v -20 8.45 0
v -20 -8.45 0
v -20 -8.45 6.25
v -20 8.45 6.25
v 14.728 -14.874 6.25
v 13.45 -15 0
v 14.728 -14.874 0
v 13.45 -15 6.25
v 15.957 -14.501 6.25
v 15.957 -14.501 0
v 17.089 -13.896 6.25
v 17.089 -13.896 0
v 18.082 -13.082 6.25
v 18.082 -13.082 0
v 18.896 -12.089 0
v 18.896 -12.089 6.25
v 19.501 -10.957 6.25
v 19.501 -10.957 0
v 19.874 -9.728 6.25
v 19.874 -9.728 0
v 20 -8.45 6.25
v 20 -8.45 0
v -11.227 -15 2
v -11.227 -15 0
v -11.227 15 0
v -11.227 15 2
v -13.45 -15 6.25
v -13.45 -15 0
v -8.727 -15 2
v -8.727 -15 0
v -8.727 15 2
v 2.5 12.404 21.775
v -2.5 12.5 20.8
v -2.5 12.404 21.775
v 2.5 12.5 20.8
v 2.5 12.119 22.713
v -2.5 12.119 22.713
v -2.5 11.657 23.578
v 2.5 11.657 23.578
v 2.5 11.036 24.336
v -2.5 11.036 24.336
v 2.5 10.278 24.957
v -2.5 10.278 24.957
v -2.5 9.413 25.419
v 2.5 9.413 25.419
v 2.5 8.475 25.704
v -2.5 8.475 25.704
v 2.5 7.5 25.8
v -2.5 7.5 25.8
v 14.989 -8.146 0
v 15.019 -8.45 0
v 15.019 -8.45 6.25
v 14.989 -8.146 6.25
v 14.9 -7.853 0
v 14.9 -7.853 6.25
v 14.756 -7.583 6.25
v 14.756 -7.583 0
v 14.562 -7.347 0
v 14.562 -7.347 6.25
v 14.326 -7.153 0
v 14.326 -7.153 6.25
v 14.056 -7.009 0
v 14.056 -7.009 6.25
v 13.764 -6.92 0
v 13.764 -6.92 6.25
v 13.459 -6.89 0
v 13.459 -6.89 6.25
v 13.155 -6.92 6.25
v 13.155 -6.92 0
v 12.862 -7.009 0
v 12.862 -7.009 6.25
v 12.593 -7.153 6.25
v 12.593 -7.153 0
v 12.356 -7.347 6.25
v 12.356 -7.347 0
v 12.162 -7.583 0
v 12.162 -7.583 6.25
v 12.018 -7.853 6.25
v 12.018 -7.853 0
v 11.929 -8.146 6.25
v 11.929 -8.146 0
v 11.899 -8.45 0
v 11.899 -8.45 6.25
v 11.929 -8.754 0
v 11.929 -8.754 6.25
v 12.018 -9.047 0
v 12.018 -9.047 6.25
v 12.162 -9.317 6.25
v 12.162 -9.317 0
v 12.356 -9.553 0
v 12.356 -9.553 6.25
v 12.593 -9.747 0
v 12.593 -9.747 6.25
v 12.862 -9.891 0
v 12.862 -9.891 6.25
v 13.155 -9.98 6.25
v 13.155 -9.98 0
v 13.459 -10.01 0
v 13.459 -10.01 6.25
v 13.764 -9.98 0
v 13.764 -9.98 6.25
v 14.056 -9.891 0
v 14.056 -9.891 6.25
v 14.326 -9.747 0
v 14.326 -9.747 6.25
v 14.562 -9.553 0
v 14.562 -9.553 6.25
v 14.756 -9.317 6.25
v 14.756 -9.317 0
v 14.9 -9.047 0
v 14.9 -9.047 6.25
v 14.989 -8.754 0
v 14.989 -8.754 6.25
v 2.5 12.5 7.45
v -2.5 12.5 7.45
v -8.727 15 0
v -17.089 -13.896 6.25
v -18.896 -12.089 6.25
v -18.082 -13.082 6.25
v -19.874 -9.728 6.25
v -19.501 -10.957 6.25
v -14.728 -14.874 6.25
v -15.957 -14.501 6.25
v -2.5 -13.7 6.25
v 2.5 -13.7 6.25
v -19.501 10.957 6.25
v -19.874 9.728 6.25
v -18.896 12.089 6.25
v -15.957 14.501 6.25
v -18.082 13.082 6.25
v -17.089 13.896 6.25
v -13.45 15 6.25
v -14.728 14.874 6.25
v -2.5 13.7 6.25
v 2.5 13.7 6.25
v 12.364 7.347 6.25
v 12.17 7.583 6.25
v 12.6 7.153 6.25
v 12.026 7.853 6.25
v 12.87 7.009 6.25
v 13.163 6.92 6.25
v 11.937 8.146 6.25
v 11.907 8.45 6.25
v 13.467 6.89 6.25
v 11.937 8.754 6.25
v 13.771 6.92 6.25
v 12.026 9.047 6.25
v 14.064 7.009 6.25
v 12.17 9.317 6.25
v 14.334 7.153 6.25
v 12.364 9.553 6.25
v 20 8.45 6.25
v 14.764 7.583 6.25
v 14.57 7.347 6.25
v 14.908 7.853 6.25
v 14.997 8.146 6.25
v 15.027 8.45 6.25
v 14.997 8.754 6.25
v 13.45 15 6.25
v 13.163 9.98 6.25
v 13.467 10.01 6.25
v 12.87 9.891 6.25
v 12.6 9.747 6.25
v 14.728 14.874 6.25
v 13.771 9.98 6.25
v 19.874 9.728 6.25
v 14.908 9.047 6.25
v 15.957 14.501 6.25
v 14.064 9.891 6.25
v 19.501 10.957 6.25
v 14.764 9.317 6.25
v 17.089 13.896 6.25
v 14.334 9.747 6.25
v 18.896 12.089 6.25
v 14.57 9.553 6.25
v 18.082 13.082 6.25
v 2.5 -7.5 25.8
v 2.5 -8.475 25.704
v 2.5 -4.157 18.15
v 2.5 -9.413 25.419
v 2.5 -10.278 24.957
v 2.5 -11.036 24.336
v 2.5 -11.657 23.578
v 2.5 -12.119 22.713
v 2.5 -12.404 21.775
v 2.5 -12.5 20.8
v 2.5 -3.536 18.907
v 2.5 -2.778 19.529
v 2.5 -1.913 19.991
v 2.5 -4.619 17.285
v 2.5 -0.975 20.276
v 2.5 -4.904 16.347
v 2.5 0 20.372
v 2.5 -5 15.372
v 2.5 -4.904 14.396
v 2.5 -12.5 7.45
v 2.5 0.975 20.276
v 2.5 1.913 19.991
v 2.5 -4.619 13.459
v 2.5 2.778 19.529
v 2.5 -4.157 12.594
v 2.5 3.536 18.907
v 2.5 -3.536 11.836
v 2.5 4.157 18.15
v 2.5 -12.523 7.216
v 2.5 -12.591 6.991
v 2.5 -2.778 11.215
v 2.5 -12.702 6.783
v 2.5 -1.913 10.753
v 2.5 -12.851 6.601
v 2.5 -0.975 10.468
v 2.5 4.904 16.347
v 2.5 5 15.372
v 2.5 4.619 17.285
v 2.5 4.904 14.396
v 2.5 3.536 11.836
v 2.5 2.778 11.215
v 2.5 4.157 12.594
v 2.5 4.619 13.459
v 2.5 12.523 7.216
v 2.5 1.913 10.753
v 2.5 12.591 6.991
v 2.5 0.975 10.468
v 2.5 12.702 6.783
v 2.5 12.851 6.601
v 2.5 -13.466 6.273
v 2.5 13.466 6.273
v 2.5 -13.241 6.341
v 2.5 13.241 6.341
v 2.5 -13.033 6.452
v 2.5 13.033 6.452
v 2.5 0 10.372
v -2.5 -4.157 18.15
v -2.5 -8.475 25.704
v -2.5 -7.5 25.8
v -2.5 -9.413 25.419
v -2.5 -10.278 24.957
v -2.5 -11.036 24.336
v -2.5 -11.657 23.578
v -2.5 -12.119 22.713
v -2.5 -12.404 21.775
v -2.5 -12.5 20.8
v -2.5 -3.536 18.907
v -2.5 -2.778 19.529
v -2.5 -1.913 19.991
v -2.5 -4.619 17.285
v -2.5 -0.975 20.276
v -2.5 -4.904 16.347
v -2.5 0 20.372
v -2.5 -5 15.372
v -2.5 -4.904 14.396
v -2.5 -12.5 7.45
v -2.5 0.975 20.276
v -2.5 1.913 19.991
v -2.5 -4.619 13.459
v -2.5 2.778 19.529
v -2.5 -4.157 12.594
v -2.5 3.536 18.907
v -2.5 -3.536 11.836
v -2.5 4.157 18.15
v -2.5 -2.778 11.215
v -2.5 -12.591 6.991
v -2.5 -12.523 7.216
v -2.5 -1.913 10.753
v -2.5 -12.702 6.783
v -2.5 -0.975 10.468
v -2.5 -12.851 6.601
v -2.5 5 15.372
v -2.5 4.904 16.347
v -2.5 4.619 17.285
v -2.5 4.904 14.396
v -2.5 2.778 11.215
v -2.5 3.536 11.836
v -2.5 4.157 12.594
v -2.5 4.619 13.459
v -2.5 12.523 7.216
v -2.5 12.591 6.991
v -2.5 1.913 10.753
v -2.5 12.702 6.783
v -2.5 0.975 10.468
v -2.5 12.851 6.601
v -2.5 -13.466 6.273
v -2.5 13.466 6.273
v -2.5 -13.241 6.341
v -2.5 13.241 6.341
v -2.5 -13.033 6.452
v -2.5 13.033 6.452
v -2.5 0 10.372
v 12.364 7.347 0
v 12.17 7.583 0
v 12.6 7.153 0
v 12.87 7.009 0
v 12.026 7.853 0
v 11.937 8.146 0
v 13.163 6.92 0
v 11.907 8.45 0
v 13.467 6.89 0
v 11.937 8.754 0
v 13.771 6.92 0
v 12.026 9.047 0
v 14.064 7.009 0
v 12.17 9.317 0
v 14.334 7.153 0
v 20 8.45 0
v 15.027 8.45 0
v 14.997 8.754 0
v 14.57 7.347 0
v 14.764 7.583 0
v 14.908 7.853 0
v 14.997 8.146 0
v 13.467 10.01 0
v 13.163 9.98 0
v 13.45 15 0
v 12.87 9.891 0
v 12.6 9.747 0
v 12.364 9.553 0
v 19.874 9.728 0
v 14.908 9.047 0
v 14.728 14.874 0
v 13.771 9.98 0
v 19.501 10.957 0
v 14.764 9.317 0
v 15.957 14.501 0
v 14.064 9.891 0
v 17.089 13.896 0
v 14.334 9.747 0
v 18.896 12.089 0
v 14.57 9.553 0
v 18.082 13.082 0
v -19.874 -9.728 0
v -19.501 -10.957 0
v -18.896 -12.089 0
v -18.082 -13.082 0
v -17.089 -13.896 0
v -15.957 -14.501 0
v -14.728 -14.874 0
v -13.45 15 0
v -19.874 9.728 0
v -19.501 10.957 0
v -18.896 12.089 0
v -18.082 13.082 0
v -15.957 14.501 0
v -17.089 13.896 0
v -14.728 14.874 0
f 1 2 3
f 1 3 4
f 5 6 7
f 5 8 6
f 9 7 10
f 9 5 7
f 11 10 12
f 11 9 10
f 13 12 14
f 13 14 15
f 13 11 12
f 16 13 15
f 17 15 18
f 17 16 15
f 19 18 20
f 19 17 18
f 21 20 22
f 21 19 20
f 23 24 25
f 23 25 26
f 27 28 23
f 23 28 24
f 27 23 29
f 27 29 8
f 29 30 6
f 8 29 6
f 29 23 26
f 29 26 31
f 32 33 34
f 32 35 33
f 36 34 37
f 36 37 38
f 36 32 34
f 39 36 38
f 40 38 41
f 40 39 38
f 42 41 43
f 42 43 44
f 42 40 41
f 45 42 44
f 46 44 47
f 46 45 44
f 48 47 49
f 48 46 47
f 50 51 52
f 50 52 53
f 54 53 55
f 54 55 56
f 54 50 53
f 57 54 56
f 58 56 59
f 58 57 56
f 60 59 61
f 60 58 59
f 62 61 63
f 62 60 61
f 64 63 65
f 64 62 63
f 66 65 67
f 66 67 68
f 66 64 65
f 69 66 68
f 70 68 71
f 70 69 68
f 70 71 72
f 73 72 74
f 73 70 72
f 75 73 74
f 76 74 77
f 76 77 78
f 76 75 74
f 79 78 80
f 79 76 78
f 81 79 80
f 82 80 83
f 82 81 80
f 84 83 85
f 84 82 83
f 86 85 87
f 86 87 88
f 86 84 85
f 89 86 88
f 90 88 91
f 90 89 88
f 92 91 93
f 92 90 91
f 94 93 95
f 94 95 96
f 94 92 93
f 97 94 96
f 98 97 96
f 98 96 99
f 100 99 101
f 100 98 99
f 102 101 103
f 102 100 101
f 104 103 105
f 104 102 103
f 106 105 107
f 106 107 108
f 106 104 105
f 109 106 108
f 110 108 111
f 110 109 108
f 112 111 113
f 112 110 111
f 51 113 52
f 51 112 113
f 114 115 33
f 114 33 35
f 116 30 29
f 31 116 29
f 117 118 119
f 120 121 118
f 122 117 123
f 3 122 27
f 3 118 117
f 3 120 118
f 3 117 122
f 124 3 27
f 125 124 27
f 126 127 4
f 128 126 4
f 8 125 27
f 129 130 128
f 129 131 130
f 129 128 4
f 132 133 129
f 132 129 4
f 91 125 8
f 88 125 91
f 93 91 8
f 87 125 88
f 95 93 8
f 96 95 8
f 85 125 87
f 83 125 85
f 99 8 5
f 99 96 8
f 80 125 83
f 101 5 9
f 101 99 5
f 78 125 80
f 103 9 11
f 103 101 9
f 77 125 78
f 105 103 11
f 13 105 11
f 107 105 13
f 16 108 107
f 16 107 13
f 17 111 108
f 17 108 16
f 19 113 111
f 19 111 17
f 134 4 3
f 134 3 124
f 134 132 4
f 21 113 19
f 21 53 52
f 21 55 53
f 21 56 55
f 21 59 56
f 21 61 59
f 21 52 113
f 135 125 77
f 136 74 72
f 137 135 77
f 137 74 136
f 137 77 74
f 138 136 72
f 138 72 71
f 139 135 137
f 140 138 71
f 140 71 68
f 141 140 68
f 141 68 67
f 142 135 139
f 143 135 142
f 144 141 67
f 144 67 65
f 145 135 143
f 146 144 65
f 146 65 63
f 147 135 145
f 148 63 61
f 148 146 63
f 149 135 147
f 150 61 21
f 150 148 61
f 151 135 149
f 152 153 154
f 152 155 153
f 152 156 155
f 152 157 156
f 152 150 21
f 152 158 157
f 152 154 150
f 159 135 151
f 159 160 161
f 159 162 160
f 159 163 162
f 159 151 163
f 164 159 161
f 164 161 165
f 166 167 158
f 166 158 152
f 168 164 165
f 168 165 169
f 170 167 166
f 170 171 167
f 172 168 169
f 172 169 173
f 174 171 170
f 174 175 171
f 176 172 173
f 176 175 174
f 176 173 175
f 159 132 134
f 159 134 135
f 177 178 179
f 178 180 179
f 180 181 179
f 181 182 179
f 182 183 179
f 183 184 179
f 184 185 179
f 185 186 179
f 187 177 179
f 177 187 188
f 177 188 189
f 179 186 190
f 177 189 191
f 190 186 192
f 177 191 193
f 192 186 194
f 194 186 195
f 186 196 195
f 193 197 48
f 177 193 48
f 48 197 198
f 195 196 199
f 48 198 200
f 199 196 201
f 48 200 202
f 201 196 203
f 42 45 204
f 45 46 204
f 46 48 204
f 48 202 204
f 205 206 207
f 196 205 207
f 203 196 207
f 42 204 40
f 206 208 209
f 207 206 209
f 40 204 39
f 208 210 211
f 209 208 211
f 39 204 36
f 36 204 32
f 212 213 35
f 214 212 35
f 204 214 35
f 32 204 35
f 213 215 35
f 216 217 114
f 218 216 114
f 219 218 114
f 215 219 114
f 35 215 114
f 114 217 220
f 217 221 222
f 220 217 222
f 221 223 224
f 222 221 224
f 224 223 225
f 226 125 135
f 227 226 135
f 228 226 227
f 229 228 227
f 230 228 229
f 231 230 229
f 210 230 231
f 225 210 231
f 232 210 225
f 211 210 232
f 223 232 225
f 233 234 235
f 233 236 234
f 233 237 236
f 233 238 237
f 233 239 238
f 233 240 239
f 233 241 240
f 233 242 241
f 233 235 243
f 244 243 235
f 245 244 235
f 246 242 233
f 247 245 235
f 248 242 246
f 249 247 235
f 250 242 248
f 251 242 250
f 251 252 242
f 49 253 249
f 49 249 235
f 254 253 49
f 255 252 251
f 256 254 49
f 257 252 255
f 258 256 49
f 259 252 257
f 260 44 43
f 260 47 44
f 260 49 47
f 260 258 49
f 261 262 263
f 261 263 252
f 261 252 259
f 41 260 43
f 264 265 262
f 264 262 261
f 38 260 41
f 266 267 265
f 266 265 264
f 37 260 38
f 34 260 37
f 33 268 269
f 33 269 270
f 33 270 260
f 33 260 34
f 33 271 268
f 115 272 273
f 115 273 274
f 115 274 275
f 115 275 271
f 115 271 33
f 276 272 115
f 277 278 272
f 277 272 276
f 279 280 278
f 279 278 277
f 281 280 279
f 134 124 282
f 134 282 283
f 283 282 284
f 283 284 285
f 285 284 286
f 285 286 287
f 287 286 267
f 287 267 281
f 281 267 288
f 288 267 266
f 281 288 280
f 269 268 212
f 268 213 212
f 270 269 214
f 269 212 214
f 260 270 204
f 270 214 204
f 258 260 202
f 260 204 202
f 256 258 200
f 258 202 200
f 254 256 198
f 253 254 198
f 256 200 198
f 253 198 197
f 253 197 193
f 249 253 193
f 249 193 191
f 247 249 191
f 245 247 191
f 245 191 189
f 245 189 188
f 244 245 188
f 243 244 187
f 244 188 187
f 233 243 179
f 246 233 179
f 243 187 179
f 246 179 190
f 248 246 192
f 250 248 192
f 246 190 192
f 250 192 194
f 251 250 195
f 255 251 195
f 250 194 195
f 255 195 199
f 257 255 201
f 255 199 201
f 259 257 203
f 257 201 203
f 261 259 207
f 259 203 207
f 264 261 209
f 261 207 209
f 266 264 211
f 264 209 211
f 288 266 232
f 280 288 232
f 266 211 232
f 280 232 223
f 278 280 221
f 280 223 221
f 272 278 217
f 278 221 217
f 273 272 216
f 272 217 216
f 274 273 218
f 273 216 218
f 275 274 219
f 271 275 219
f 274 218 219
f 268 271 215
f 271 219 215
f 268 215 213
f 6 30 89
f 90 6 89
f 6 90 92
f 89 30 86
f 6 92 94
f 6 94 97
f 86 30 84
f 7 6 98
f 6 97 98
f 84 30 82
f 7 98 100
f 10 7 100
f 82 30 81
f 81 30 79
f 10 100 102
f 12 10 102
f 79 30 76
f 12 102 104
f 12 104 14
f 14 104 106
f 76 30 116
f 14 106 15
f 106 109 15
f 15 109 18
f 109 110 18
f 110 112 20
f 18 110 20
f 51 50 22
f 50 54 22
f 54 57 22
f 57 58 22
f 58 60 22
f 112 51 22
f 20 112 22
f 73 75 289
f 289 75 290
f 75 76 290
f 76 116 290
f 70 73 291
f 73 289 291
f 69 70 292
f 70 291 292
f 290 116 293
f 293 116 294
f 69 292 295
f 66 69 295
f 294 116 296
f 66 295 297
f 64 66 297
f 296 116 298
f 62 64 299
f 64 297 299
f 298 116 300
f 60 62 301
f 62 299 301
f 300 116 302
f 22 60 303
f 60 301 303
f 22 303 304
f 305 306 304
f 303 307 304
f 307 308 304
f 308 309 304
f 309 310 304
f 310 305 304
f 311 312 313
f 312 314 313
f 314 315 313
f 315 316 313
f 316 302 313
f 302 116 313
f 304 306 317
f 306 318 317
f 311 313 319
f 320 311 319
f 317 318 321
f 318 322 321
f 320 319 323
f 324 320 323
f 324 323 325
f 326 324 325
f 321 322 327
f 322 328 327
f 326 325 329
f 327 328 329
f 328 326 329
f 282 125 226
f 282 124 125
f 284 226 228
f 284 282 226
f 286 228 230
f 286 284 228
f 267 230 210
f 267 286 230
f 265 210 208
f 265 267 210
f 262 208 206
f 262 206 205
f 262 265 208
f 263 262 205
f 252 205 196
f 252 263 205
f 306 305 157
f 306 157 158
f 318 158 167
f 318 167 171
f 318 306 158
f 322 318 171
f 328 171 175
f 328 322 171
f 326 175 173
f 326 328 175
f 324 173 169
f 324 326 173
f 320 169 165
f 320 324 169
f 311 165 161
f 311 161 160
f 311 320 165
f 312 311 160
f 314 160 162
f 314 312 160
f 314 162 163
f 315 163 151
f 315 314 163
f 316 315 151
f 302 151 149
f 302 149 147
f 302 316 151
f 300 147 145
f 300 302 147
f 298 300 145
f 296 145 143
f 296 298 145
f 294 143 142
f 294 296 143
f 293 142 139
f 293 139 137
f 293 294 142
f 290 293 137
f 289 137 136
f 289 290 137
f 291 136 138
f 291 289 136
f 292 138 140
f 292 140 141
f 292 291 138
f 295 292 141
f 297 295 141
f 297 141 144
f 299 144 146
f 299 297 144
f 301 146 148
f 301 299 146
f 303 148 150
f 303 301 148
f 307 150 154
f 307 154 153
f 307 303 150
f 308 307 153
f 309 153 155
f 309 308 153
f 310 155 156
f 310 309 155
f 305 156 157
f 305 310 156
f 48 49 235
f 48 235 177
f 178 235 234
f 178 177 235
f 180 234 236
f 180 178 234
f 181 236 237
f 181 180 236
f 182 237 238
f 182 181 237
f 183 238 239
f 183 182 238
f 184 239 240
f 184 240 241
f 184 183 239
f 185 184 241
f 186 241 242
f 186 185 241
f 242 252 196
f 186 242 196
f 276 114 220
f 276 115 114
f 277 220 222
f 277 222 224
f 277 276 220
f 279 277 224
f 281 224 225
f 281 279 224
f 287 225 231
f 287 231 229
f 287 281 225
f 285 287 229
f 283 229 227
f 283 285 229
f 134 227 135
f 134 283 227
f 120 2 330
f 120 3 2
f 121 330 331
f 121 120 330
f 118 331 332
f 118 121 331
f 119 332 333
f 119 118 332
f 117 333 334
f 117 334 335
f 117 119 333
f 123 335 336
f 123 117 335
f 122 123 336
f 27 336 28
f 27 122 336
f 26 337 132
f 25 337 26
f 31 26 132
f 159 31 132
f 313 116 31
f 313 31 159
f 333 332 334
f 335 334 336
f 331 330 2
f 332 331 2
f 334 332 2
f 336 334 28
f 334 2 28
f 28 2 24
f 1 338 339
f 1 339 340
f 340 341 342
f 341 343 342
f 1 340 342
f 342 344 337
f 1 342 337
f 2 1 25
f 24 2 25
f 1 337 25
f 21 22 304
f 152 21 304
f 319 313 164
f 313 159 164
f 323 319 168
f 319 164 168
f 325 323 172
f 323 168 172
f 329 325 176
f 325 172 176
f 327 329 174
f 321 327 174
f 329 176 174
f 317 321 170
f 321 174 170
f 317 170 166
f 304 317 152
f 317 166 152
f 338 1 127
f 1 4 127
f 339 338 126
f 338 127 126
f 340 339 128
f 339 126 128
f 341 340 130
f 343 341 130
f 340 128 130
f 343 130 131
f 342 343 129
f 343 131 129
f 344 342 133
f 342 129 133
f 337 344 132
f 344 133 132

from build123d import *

# Parameters (mm, degrees)
F0_W      = 40
F0_H      = 30
F0_R      = 1.56
F1_DEPTH  = 6.25
F2_R      = 6.55
F4_W      = 5
F4_H      = 25
F5_DEPTH  = 20
F6_R      = 5
F7_R      = 1.2
F9_W      = 2.5
F9_H      = 2
F10_DEPTH = 36
F11_R     = 5
F12_DEPTH = 15.5


with BuildPart() as f1:
    # F0 (on Top) → F1 (new body)
    with BuildSketch(Plane.XY):
        Rectangle(F0_W, F0_H)
        with Locations((13.459221, -8.45)):
            Circle(F0_R, mode=Mode.SUBTRACT)
        with Locations((13.466984, 8.45)):
            Circle(F0_R, mode=Mode.SUBTRACT)
    extrude(amount=F1_DEPTH)

    # F2
    f2_edges = [f1.edges().sort_by_distance(p)[0] for p in [
        (-20, -15, 3.125),
        (-20, 15, 3.125),
        (20, -15, 3.125),
        (20, 15, 3.125),
    ]]
    fillet(f2_edges, radius=F2_R)

    # F4 (on offset) → F5 (join)
    with BuildSketch(Plane.XY.offset(5.8)):
        Rectangle(F4_W, F4_H)
    extrude(amount=F5_DEPTH)

    # F6
    f6_edges = [f1.edges().sort_by_distance(p)[0] for p in [
        (0, 12.5, 25.8),
        (0, -12.5, 25.8),
    ]]
    fillet(f6_edges, radius=F6_R)

    # F7
    f7_edges = [f1.edges().sort_by_distance(p)[0] for p in [
        (0, -12.5, 6.25),
        (0, 12.5, 6.25),
    ]]
    fillet(f7_edges, radius=F7_R)

    # F9 (on offset) → F10 (cut)
    with BuildSketch(Plane.XZ.offset(15.1)):
        with Locations((-9.976846, 1)):
            Rectangle(F9_W, F9_H)
    extrude(amount=-F10_DEPTH, mode=Mode.SUBTRACT)

    # F11 (on Right) → F12 (cut, symmetric)
    with BuildSketch(Plane.YZ):
        with Locations((0, 15.371925)):
            Circle(F11_R)
    extrude(amount=F12_DEPTH, both=True, mode=Mode.SUBTRACT)


solid = f1.part
